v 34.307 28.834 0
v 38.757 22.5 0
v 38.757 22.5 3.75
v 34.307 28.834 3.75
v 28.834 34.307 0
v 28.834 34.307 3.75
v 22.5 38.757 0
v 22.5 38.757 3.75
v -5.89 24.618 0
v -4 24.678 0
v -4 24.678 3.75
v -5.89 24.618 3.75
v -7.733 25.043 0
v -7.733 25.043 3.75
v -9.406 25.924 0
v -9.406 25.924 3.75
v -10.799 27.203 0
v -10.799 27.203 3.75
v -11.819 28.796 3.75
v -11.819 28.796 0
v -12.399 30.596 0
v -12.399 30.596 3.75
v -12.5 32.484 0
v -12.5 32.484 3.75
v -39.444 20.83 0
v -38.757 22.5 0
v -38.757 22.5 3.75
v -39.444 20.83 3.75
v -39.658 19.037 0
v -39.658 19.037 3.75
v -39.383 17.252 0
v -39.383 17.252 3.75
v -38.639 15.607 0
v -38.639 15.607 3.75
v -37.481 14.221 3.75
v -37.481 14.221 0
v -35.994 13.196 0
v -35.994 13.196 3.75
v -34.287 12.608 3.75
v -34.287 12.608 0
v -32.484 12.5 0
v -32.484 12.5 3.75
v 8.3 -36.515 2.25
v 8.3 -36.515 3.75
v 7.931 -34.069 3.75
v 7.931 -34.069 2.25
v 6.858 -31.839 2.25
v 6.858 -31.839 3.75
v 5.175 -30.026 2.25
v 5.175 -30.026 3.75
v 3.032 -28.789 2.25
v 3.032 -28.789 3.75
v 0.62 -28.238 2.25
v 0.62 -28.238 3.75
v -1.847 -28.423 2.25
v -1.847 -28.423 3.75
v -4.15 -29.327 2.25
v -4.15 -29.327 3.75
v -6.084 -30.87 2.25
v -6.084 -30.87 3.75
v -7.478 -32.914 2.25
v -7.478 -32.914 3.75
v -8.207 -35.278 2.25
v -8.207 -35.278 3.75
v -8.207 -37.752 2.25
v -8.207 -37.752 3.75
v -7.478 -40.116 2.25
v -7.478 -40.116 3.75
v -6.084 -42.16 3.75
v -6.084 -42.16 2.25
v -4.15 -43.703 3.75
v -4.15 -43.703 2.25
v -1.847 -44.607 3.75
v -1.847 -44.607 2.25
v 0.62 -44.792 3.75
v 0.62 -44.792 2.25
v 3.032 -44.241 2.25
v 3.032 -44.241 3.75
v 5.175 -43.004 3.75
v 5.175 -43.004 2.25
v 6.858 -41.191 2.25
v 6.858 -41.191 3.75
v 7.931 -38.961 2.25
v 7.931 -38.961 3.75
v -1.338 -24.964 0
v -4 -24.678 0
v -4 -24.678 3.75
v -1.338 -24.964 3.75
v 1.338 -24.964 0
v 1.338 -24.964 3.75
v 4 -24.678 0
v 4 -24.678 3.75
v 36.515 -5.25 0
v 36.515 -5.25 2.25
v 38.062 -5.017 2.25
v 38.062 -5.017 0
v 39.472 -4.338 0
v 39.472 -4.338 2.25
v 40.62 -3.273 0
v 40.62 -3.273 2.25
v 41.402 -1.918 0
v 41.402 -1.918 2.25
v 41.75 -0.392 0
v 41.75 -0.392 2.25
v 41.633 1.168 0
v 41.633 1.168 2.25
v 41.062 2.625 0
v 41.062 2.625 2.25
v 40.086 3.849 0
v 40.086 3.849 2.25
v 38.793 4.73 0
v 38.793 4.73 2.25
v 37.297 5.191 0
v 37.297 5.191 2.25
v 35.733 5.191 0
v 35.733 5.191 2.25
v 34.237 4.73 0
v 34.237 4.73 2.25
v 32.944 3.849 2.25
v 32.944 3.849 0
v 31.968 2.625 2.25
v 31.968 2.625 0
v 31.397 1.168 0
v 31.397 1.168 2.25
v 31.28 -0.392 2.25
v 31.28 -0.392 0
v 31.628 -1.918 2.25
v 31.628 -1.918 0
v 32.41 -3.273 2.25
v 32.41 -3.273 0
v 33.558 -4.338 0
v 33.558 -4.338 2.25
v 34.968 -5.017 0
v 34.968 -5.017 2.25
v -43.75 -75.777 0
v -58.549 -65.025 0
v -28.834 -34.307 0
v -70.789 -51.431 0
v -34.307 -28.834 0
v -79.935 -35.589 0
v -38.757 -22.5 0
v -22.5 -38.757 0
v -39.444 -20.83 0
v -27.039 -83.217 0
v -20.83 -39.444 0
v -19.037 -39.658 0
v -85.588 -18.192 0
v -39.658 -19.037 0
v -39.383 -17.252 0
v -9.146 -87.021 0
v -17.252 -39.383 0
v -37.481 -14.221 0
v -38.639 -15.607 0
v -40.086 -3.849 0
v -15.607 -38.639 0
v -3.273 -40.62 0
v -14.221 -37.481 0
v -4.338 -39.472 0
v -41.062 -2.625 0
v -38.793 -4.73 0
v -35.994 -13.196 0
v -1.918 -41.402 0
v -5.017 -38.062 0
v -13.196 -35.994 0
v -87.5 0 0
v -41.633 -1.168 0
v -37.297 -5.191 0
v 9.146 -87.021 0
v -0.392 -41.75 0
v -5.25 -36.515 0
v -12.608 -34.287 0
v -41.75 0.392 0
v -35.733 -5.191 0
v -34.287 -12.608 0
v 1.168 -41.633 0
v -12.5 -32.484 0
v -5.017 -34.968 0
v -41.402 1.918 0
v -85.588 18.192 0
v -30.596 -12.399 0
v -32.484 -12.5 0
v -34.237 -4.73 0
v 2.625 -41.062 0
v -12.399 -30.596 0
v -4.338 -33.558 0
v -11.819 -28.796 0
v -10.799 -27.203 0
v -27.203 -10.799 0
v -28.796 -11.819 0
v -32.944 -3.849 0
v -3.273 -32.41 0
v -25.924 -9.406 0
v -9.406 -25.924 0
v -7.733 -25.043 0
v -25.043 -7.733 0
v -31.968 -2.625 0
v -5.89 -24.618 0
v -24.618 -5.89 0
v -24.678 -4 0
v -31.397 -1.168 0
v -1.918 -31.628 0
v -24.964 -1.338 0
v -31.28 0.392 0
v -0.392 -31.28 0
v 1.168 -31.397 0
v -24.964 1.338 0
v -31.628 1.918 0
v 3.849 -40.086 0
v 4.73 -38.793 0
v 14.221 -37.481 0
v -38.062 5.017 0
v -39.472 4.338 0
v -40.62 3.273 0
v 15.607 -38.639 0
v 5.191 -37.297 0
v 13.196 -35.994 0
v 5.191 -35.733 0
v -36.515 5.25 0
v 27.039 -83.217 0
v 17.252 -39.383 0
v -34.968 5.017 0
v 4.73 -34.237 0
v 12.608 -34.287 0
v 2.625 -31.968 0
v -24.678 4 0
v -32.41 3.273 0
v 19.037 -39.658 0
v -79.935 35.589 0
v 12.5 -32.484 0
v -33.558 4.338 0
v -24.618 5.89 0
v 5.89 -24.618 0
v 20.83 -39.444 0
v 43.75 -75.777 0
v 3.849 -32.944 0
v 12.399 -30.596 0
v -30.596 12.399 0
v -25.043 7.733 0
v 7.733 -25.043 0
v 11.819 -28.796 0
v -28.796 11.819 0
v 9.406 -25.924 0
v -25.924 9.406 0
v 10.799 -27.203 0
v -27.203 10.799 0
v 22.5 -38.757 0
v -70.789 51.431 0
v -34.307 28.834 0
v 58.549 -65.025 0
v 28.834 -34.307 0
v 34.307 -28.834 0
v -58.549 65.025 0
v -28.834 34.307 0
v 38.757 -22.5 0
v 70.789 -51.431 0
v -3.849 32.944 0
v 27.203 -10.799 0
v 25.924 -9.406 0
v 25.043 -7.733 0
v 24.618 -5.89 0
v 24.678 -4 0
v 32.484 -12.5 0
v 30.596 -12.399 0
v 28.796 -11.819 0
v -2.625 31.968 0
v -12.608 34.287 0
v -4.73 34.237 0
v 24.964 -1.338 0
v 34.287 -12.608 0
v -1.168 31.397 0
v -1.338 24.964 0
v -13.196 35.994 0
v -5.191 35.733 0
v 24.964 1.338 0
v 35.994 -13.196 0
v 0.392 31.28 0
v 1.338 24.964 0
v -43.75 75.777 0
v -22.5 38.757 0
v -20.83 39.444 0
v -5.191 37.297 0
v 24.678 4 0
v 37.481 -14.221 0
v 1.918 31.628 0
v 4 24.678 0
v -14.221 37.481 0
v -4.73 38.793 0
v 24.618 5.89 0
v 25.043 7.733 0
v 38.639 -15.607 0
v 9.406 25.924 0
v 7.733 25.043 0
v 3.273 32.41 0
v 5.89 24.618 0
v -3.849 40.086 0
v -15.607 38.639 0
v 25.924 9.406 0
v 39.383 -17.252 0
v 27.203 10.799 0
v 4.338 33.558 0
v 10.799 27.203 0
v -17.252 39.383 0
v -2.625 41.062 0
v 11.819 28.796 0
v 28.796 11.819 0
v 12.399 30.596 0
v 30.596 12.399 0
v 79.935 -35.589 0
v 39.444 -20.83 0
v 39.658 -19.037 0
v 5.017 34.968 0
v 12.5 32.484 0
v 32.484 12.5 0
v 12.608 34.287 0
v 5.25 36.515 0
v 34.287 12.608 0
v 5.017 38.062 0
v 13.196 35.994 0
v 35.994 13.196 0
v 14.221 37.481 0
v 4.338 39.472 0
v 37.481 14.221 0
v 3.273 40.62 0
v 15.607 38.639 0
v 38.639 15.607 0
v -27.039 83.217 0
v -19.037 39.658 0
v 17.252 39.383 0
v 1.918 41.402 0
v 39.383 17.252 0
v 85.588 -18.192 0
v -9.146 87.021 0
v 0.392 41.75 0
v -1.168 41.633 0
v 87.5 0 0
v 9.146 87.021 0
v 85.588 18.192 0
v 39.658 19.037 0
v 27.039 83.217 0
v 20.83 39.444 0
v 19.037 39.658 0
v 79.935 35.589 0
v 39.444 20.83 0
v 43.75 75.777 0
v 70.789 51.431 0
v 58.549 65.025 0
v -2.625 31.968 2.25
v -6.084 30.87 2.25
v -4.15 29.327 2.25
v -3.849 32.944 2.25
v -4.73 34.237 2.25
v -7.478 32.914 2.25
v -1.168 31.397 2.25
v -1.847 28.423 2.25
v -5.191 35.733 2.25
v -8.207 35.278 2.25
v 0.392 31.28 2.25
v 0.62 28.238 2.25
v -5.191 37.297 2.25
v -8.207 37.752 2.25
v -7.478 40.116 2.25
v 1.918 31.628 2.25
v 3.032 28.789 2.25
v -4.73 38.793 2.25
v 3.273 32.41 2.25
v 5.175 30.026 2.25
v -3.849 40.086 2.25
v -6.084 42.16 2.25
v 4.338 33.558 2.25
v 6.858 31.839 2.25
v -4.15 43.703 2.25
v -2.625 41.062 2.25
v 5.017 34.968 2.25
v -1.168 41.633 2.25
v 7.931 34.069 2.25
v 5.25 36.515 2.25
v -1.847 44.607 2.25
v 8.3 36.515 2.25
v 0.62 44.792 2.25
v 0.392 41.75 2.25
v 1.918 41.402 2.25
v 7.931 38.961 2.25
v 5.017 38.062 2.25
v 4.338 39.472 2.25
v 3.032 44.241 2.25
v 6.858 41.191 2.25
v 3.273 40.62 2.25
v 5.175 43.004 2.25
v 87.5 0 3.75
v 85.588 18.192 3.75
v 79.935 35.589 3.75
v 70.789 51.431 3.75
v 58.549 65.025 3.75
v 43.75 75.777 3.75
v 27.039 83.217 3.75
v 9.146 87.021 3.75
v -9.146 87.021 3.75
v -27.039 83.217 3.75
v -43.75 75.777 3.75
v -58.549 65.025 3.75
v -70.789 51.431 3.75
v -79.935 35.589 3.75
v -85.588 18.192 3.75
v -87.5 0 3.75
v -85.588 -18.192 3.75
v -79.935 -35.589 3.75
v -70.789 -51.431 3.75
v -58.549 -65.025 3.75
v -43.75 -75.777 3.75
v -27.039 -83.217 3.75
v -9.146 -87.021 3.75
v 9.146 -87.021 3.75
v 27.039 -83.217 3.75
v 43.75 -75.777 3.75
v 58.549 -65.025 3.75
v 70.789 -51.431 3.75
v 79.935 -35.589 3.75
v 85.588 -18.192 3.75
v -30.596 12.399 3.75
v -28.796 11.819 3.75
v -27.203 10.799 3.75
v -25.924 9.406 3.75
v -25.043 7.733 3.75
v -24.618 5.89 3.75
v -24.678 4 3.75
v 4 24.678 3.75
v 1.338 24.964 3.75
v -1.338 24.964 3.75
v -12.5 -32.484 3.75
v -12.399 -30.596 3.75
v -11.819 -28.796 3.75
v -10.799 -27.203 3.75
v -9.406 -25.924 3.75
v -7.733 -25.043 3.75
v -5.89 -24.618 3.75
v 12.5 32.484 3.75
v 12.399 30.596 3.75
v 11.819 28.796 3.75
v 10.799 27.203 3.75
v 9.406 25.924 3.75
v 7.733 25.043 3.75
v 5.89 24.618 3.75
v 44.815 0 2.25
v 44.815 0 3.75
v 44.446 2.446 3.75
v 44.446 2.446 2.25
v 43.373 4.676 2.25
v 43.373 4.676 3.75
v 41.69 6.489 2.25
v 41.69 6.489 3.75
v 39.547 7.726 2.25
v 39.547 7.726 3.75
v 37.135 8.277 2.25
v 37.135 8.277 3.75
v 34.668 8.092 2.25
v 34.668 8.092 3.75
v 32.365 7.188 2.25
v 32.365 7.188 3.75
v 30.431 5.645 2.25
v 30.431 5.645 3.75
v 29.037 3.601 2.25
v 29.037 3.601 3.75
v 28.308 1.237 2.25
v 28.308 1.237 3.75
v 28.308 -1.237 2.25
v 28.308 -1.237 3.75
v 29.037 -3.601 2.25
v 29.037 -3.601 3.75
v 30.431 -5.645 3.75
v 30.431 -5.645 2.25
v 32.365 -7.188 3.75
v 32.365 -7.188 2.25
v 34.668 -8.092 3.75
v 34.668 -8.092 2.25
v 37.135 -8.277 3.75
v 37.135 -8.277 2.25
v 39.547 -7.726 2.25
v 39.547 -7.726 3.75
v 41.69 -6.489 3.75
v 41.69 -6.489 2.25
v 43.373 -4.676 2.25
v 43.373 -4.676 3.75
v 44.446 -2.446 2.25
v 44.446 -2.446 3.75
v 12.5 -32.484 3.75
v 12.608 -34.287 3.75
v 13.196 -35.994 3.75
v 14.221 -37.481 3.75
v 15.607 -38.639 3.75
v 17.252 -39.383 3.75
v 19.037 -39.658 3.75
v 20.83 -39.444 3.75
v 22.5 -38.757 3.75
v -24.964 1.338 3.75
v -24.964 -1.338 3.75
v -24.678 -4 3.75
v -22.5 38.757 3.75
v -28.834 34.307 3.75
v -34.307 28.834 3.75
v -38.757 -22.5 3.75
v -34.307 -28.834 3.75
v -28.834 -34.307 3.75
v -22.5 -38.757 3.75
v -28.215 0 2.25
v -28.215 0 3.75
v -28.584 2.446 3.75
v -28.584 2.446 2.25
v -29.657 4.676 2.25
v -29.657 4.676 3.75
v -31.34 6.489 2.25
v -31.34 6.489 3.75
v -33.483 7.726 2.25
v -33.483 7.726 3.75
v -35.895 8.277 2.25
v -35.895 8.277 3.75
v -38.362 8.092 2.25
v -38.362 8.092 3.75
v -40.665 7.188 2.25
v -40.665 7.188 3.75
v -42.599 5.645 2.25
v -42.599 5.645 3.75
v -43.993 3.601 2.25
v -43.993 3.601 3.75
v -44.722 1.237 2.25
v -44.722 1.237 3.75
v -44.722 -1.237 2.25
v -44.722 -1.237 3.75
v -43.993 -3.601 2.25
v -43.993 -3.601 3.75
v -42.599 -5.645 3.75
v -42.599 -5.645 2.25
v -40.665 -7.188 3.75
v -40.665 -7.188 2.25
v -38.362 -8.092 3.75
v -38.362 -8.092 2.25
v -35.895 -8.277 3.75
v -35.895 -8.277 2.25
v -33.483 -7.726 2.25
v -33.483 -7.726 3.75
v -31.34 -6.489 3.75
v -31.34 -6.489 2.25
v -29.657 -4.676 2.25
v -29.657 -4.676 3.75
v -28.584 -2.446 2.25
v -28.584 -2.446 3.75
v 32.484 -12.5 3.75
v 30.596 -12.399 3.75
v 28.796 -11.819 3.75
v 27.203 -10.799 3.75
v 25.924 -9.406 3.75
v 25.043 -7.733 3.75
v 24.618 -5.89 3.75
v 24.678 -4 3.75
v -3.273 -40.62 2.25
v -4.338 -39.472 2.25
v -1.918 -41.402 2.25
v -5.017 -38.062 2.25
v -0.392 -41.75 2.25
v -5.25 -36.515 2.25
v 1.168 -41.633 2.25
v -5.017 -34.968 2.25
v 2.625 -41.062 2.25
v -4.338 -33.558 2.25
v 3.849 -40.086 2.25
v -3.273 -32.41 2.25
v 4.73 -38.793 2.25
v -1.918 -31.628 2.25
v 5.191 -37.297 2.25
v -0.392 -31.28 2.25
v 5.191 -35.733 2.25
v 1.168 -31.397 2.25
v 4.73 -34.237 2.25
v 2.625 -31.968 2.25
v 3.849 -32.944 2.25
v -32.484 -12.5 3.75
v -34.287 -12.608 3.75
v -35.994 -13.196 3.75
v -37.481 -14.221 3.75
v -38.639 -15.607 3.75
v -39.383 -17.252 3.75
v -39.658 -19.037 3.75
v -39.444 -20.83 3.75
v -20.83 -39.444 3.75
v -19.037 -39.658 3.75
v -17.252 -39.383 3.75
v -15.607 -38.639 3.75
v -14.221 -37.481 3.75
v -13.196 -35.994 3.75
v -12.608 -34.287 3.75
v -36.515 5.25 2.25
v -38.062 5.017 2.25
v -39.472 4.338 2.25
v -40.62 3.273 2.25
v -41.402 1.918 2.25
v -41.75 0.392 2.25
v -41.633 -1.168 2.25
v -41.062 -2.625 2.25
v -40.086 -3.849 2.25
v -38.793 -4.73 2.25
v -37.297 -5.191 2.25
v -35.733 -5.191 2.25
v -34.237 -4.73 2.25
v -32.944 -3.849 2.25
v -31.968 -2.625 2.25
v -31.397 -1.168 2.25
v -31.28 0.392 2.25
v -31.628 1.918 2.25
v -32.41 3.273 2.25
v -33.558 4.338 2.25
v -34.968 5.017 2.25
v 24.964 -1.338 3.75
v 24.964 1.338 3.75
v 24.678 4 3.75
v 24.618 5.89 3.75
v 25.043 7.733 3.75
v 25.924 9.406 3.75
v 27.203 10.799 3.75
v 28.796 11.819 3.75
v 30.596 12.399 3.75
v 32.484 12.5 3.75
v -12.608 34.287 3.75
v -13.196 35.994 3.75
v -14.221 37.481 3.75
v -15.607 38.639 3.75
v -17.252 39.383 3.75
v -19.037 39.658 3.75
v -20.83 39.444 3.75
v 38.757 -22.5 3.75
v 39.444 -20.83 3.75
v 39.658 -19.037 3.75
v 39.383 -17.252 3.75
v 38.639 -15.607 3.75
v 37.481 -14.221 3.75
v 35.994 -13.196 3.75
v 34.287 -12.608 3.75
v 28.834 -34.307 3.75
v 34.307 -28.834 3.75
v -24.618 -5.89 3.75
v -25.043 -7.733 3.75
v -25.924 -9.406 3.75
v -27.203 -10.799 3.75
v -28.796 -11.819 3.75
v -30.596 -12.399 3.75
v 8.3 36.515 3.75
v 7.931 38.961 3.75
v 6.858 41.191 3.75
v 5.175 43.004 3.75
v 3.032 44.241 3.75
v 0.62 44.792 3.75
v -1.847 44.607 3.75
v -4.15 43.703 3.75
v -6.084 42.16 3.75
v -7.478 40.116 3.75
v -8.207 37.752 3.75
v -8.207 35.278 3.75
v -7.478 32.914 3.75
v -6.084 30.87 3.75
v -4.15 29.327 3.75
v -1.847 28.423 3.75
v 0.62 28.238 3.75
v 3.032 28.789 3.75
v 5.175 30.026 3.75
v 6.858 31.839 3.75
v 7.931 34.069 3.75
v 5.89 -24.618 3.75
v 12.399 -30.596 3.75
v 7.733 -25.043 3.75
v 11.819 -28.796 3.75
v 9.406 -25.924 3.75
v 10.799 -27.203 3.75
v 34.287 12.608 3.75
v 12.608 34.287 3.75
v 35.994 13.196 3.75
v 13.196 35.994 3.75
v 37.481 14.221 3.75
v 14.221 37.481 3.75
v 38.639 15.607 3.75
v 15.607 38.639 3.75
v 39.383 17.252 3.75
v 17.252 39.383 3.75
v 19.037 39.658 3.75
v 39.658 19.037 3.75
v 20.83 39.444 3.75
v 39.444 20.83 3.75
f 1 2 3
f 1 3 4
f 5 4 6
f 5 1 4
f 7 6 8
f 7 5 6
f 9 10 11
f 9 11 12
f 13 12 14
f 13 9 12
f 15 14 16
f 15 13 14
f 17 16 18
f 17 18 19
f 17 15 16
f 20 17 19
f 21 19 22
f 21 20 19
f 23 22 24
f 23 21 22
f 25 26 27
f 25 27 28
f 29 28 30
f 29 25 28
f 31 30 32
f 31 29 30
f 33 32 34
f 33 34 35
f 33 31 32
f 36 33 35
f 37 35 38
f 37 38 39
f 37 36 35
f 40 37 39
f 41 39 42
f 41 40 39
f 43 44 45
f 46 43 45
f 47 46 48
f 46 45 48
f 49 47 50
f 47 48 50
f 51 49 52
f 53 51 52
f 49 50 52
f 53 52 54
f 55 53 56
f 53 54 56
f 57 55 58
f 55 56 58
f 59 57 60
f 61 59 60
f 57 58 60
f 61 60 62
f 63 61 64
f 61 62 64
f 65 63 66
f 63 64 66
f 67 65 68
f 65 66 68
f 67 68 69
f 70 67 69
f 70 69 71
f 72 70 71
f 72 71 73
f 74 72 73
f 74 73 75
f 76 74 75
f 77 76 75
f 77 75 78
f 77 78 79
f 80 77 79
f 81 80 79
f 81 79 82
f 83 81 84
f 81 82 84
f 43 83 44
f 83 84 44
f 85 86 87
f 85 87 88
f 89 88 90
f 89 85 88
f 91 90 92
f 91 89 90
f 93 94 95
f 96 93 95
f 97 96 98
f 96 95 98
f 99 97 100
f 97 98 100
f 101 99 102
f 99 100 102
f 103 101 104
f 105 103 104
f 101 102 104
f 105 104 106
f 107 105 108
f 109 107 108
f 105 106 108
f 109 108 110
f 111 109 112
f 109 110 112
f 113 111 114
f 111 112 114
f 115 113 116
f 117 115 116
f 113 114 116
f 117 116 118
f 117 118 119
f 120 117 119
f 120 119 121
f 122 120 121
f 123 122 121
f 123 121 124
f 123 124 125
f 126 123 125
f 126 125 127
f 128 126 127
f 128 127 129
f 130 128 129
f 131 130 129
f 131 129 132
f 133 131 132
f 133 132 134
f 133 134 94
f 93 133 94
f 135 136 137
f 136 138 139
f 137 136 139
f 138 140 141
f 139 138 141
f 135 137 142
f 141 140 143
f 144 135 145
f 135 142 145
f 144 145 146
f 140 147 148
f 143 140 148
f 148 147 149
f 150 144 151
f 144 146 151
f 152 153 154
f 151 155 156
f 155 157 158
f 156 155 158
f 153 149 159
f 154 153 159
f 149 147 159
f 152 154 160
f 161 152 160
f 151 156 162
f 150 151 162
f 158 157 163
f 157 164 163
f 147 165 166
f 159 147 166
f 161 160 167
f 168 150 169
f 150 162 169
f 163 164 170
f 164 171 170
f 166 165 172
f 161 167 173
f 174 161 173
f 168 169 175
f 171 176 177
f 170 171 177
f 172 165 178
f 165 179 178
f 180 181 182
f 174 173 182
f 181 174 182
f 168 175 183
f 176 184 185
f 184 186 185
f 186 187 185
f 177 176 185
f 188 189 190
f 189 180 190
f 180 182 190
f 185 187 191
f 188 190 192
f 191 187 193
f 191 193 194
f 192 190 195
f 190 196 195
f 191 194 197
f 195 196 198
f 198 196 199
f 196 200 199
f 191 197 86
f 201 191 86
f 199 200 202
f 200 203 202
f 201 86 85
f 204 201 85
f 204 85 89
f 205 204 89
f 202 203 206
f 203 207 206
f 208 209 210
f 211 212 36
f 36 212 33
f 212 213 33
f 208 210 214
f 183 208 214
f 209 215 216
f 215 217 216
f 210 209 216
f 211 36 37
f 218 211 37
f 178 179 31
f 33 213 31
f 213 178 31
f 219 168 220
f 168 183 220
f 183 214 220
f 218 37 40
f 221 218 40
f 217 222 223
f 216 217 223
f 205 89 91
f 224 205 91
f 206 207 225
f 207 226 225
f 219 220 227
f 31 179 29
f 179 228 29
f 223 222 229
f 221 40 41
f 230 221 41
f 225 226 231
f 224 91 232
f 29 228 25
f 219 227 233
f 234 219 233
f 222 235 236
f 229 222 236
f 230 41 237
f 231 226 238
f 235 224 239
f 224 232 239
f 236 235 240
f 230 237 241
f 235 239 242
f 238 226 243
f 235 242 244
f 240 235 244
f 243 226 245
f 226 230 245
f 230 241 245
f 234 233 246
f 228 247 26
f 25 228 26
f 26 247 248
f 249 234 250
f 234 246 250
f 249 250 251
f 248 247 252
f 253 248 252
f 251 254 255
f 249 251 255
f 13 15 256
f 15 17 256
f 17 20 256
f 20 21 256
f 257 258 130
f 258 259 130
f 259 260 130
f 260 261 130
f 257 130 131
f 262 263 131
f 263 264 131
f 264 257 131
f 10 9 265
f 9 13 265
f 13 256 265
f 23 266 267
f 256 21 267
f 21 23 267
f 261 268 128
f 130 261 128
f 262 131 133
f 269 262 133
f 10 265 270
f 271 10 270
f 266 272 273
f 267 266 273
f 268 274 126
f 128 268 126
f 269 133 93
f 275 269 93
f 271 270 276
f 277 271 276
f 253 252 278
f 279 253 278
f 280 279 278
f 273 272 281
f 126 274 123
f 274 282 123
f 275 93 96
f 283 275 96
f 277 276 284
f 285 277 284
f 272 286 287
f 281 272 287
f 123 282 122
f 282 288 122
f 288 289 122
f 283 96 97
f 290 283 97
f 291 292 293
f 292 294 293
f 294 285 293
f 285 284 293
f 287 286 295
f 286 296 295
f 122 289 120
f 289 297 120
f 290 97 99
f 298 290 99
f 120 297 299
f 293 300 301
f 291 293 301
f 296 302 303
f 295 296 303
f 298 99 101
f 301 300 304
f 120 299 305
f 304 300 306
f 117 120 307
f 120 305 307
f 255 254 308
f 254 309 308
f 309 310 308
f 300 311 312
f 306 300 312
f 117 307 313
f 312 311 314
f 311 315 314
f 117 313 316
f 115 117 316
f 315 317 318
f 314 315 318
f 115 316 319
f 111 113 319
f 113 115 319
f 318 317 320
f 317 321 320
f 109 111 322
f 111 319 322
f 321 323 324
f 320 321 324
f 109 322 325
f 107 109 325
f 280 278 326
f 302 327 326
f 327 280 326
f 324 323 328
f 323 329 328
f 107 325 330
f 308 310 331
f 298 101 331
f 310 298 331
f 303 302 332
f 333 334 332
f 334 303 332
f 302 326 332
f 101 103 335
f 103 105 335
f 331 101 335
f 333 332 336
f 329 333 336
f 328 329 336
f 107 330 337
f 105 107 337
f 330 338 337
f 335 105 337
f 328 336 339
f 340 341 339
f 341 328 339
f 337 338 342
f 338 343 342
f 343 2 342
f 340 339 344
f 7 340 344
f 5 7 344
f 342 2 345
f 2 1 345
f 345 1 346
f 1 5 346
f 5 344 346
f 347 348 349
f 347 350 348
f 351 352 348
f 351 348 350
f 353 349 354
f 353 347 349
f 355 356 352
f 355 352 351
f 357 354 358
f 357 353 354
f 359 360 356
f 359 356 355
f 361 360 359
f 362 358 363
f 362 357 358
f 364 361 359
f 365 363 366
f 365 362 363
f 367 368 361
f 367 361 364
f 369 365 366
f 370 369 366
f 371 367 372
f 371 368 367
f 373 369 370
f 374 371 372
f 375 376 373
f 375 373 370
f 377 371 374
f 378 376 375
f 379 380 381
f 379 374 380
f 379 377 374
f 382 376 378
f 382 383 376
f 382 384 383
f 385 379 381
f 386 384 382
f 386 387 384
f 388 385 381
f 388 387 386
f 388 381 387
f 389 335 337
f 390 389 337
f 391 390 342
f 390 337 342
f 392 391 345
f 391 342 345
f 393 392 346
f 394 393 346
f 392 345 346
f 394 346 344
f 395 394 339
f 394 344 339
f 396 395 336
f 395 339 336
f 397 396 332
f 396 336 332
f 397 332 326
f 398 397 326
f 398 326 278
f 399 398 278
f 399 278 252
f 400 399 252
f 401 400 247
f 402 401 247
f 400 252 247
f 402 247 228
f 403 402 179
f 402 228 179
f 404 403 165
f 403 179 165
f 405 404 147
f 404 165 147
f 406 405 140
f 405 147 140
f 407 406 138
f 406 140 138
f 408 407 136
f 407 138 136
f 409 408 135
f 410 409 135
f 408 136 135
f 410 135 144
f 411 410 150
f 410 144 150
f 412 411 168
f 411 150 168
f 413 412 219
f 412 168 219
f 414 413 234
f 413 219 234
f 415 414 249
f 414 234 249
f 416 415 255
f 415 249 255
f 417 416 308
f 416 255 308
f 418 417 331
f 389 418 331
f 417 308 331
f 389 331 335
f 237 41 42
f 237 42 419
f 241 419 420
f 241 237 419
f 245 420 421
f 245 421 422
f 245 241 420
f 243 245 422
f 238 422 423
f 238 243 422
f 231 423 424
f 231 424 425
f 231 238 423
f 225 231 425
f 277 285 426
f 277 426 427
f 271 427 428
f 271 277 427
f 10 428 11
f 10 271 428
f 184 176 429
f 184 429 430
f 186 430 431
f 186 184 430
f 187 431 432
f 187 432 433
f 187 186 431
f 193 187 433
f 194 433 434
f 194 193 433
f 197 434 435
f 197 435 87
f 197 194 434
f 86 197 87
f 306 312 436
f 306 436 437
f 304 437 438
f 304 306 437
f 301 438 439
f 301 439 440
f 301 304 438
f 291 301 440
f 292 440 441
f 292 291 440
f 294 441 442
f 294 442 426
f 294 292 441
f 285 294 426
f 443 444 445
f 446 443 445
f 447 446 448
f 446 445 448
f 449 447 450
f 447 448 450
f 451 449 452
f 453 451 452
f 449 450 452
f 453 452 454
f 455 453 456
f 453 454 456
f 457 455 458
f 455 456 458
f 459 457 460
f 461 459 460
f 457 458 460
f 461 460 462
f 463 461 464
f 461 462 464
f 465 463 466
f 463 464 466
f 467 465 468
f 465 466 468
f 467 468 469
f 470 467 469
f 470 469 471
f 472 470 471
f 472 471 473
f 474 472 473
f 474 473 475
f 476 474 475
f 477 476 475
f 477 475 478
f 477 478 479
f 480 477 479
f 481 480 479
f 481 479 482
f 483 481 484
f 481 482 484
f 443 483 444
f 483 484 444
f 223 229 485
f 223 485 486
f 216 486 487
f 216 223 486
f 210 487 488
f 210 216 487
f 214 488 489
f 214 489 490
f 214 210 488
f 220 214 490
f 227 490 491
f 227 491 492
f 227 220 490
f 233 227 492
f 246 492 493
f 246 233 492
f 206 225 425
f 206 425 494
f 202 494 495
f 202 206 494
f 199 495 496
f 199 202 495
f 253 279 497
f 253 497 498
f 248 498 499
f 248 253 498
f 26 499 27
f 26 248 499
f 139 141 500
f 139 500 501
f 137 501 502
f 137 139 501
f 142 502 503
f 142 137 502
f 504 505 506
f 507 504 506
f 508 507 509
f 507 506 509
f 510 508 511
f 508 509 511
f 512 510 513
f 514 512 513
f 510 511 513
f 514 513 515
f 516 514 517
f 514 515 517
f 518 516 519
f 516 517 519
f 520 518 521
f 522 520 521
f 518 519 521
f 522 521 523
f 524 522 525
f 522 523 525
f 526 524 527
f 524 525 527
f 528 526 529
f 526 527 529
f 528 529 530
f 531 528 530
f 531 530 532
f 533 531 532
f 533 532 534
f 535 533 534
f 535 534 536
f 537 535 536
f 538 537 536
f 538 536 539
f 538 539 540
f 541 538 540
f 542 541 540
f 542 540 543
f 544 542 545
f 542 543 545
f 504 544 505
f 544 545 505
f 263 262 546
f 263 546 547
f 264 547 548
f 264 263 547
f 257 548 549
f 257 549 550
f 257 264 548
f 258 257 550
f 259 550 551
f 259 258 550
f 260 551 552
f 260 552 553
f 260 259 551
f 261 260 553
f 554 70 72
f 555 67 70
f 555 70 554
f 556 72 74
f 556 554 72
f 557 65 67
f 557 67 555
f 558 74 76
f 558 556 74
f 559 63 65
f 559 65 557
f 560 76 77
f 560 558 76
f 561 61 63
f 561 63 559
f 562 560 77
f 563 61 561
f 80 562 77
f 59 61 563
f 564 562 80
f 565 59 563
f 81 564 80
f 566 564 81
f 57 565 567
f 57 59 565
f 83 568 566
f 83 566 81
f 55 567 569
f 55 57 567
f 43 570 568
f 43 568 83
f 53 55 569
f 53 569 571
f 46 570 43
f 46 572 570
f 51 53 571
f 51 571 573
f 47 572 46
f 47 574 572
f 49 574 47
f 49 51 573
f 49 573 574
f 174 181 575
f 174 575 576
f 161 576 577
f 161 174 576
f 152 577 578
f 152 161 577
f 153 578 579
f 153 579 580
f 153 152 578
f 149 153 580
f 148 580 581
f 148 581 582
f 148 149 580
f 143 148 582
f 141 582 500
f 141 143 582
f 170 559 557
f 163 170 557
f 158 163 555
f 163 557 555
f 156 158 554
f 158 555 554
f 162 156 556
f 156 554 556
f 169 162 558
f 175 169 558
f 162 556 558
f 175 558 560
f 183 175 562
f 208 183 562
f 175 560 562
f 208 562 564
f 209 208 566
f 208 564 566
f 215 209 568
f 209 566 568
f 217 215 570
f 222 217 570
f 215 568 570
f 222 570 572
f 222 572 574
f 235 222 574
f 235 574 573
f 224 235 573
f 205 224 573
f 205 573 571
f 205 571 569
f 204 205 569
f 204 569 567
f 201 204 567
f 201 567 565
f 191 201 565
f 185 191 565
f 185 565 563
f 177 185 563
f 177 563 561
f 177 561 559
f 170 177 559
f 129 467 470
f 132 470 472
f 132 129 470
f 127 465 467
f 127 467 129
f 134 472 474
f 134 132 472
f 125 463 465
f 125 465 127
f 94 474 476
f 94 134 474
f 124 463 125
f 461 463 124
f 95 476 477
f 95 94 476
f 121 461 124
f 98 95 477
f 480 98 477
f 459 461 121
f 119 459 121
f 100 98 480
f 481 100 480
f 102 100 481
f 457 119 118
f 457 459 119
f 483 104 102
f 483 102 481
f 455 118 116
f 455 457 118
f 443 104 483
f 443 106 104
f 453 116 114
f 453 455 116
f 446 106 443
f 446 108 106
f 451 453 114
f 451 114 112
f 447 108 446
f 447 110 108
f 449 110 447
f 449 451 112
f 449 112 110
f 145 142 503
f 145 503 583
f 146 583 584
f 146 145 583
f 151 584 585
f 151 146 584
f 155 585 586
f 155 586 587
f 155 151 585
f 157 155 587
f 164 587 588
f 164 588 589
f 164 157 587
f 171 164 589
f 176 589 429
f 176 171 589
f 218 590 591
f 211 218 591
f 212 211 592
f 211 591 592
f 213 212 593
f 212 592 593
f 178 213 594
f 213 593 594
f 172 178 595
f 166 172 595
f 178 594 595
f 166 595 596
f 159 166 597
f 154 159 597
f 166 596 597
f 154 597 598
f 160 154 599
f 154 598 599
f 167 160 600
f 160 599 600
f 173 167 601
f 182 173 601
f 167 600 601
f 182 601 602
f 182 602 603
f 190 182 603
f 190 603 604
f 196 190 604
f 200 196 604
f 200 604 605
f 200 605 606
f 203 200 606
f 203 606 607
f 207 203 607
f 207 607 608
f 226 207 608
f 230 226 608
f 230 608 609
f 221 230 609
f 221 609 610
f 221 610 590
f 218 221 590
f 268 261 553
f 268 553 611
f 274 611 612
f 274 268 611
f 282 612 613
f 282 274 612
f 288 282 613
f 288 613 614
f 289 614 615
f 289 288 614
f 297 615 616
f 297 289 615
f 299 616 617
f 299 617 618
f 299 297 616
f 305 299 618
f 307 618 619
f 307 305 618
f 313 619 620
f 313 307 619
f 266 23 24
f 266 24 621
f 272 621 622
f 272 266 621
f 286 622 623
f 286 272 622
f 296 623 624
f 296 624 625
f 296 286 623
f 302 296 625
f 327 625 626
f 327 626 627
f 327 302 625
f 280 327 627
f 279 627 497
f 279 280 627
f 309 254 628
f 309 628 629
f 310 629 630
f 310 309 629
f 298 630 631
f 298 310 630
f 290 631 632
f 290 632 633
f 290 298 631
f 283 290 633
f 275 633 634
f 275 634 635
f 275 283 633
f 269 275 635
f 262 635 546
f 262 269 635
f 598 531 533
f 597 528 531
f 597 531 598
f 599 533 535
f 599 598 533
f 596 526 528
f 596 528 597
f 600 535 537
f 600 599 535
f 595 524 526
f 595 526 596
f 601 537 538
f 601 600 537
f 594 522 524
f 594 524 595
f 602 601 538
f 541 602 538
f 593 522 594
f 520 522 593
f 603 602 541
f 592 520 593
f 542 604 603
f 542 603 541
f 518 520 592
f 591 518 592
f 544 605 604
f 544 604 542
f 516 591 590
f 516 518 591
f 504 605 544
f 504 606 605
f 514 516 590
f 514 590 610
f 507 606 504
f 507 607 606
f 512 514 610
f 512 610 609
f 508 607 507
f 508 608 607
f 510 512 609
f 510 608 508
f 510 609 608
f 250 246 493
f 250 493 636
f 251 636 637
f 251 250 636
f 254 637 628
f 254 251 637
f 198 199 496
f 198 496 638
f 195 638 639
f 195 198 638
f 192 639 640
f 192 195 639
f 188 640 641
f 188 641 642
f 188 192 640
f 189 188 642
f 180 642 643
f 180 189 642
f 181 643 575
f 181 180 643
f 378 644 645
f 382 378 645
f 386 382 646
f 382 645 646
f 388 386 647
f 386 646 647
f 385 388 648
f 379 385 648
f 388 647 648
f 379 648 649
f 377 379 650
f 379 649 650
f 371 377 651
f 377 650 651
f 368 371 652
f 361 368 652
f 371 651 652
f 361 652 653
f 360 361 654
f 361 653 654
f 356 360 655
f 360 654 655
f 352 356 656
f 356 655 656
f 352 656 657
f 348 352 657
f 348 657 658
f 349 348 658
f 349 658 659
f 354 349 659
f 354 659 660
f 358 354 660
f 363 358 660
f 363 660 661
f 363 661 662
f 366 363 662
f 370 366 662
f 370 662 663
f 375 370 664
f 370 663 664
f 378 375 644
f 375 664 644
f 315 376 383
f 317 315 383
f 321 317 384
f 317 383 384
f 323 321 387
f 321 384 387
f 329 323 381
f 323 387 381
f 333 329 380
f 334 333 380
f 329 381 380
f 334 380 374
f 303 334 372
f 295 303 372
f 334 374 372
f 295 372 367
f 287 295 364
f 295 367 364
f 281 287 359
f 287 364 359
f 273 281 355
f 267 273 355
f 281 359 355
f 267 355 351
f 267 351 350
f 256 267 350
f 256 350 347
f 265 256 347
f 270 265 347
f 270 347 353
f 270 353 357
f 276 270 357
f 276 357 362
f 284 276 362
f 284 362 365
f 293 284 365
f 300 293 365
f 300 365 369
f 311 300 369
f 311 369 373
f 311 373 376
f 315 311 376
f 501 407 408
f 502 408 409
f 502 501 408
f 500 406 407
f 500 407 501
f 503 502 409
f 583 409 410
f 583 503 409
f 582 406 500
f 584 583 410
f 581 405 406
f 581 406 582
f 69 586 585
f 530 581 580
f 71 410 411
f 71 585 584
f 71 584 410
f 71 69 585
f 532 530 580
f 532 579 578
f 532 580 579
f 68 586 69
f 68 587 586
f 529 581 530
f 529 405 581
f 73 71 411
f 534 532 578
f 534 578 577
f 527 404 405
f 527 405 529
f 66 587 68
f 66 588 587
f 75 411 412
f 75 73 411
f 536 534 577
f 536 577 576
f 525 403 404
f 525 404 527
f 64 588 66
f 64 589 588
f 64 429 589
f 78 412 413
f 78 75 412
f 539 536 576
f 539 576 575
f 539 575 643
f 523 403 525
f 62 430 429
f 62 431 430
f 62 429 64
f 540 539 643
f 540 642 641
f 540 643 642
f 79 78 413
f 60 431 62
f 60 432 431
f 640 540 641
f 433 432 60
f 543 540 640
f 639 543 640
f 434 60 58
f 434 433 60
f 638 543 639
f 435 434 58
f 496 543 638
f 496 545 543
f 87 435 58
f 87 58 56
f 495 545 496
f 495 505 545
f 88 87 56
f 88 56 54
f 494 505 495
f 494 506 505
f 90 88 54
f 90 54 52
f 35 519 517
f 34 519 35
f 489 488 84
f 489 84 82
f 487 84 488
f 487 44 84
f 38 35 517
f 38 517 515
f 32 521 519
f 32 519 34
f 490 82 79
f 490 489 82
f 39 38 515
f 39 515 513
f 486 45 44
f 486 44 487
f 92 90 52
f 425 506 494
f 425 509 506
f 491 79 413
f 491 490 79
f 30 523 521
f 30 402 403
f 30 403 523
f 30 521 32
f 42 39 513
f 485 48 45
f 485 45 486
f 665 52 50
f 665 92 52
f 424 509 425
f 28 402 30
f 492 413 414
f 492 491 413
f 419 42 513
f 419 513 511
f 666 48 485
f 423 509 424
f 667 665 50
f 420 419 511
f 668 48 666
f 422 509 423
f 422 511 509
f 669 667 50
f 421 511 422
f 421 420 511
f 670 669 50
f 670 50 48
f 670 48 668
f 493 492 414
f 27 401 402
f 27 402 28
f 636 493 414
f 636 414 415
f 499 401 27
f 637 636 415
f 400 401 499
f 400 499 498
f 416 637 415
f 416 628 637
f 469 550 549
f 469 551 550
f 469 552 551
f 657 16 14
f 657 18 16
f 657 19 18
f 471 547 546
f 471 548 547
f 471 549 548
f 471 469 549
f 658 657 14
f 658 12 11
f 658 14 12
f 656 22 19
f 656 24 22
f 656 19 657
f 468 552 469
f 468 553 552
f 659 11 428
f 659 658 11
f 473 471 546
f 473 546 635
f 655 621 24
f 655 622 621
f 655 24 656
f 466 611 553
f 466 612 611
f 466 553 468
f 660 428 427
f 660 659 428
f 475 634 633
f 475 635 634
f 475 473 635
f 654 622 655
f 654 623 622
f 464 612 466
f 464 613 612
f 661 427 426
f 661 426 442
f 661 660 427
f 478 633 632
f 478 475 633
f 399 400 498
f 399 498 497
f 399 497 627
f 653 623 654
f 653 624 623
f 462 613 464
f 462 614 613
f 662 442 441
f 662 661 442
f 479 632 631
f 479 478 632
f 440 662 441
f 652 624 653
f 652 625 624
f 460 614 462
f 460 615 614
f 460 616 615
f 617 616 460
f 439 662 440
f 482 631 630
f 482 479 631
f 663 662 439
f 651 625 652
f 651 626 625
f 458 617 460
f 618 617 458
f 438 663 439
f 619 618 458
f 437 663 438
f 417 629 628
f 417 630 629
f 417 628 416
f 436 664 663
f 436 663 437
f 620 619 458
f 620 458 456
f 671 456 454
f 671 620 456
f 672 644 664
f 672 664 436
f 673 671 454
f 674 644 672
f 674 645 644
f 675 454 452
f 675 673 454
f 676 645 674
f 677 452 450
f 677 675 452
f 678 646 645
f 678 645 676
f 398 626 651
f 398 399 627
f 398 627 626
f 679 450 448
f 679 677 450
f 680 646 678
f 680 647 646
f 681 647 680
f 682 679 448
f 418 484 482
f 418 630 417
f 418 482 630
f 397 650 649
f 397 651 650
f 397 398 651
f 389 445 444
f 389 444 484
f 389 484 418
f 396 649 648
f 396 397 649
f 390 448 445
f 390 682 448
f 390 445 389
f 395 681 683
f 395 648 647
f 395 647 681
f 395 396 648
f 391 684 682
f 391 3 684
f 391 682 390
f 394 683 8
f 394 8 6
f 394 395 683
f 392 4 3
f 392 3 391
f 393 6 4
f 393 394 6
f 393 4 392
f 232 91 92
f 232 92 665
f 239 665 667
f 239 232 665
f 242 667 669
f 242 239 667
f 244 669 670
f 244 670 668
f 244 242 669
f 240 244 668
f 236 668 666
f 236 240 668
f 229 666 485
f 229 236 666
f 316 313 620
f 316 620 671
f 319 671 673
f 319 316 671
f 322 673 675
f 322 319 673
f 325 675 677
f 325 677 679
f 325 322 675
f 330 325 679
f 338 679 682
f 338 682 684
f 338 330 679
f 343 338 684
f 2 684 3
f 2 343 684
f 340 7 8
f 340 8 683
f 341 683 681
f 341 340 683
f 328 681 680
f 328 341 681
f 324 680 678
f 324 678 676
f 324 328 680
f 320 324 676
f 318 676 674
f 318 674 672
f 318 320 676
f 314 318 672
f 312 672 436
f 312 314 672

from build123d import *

# Parameters (mm, degrees)
CROQUIS1_R              = 87.5
SALIENTE_EXTRUIR1_DEPTH = 3.75
CROQUIS2_R              = 8.3
CORTAR_EXTRUIR1_DEPTH   = 1.5
CROQUIS3_R              = 5.25
CORTAR_EXTRUIR2_DEPTH   = 4.75
MATRIZC1_COUNT          = 8


with BuildPart() as part:
    # Croquis1 → Saliente-Extruir1 (new body)
    with BuildSketch(Plane.XY):
        Circle(CROQUIS1_R)
        with BuildLine():
            ThreePointArc((-38.757376395, -22.5), (-31.688990399, -31.688990399), (-22.5, -38.757376395))
            ThreePointArc((-22.5, -38.757376395), (-15.606593782, -38.639265866), (-12.5, -32.484424319))
            ThreePointArc((-12.5, -32.484424319), (-10.144121841, -26.518786087), (-4, -24.677925359))
            ThreePointArc((-4, -24.677925359), (0, -25), (4, -24.677925359))
            ThreePointArc((4, -24.677925359), (10.144121841, -26.518786087), (12.5, -32.484424319))
            ThreePointArc((12.5, -32.484424319), (15.606593782, -38.639265866), (22.5, -38.757376395))
            ThreePointArc((22.5, -38.757376395), (31.688990399, -31.688990399), (38.757376395, -22.5))
            ThreePointArc((38.757376395, -22.5), (38.639265866, -15.606593782), (32.484424319, -12.5))
            ThreePointArc((32.484424319, -12.5), (26.518786087, -10.144121841), (24.677925359, -4))
            ThreePointArc((24.677925359, -4), (25, 0), (24.677925359, 4))
            ThreePointArc((24.677925359, 4), (26.518786087, 10.144121841), (32.484424319, 12.5))
            ThreePointArc((32.484424319, 12.5), (38.639265866, 15.606593782), (38.757376395, 22.5))
            ThreePointArc((38.757376395, 22.5), (31.688990399, 31.688990399), (22.5, 38.757376395))
            ThreePointArc((22.5, 38.757376395), (15.606593782, 38.639265866), (12.5, 32.484424319))
            ThreePointArc((12.5, 32.484424319), (10.144121841, 26.518786087), (4, 24.677925359))
            ThreePointArc((4, 24.677925359), (0, 25), (-4, 24.677925359))
            ThreePointArc((-4, 24.677925359), (-10.144121841, 26.518786087), (-12.5, 32.484424319))
            ThreePointArc((-12.5, 32.484424319), (-15.606593782, 38.639265866), (-22.5, 38.757376395))
            ThreePointArc((-22.5, 38.757376395), (-31.688990399, 31.688990399), (-38.757376395, 22.5))
            ThreePointArc((-38.757376395, 22.5), (-38.639265866, 15.606593782), (-32.484424319, 12.5))
            ThreePointArc((-32.484424319, 12.5), (-26.518786087, 10.144121841), (-24.677925359, 4))
            ThreePointArc((-24.677925359, 4), (-25, 0), (-24.677925359, -4))
            ThreePointArc((-24.677925359, -4), (-26.518786087, -10.144121841), (-32.484424319, -12.5))
            ThreePointArc((-32.484424319, -12.5), (-38.639265866, -15.606593782), (-38.757376395, -22.5))
        make_face(mode=Mode.SUBTRACT)
    extrude(amount=SALIENTE_EXTRUIR1_DEPTH)

    # Croquis2 → Cortar-Extruir1 (cut)
    with BuildSketch(Plane.XY.offset(3.75)):
        with Locations((-36.515, 0)):
            Circle(CROQUIS2_R)
        with Locations((0, 36.515)):
            Circle(CROQUIS2_R)
        with Locations((36.515, 0)):
            Circle(CROQUIS2_R)
        with Locations((0, -36.515)):
            Circle(CROQUIS2_R)
    extrude(amount=-CORTAR_EXTRUIR1_DEPTH, mode=Mode.SUBTRACT)

    # Croquis3 → Cortar-Extruir2 (cut, through all)
    with BuildSketch(Plane.XY.offset(3.75)):
        with Locations((0, 36.515)):
            Circle(CROQUIS3_R)
    cortar_extruir2 = extrude(amount=-CORTAR_EXTRUIR2_DEPTH, mode=Mode.SUBTRACT)

    # MatrizC1: Cortar-Extruir2 ×8 about axis
    matrizc1_axis = Axis((0, 0, 3.75), (0, 0, 1))
    for i in range(1, MATRIZC1_COUNT):
        add(cortar_extruir2.rotate(matrizc1_axis, i * 360 / MATRIZC1_COUNT), mode=Mode.SUBTRACT)


solid = part.part
